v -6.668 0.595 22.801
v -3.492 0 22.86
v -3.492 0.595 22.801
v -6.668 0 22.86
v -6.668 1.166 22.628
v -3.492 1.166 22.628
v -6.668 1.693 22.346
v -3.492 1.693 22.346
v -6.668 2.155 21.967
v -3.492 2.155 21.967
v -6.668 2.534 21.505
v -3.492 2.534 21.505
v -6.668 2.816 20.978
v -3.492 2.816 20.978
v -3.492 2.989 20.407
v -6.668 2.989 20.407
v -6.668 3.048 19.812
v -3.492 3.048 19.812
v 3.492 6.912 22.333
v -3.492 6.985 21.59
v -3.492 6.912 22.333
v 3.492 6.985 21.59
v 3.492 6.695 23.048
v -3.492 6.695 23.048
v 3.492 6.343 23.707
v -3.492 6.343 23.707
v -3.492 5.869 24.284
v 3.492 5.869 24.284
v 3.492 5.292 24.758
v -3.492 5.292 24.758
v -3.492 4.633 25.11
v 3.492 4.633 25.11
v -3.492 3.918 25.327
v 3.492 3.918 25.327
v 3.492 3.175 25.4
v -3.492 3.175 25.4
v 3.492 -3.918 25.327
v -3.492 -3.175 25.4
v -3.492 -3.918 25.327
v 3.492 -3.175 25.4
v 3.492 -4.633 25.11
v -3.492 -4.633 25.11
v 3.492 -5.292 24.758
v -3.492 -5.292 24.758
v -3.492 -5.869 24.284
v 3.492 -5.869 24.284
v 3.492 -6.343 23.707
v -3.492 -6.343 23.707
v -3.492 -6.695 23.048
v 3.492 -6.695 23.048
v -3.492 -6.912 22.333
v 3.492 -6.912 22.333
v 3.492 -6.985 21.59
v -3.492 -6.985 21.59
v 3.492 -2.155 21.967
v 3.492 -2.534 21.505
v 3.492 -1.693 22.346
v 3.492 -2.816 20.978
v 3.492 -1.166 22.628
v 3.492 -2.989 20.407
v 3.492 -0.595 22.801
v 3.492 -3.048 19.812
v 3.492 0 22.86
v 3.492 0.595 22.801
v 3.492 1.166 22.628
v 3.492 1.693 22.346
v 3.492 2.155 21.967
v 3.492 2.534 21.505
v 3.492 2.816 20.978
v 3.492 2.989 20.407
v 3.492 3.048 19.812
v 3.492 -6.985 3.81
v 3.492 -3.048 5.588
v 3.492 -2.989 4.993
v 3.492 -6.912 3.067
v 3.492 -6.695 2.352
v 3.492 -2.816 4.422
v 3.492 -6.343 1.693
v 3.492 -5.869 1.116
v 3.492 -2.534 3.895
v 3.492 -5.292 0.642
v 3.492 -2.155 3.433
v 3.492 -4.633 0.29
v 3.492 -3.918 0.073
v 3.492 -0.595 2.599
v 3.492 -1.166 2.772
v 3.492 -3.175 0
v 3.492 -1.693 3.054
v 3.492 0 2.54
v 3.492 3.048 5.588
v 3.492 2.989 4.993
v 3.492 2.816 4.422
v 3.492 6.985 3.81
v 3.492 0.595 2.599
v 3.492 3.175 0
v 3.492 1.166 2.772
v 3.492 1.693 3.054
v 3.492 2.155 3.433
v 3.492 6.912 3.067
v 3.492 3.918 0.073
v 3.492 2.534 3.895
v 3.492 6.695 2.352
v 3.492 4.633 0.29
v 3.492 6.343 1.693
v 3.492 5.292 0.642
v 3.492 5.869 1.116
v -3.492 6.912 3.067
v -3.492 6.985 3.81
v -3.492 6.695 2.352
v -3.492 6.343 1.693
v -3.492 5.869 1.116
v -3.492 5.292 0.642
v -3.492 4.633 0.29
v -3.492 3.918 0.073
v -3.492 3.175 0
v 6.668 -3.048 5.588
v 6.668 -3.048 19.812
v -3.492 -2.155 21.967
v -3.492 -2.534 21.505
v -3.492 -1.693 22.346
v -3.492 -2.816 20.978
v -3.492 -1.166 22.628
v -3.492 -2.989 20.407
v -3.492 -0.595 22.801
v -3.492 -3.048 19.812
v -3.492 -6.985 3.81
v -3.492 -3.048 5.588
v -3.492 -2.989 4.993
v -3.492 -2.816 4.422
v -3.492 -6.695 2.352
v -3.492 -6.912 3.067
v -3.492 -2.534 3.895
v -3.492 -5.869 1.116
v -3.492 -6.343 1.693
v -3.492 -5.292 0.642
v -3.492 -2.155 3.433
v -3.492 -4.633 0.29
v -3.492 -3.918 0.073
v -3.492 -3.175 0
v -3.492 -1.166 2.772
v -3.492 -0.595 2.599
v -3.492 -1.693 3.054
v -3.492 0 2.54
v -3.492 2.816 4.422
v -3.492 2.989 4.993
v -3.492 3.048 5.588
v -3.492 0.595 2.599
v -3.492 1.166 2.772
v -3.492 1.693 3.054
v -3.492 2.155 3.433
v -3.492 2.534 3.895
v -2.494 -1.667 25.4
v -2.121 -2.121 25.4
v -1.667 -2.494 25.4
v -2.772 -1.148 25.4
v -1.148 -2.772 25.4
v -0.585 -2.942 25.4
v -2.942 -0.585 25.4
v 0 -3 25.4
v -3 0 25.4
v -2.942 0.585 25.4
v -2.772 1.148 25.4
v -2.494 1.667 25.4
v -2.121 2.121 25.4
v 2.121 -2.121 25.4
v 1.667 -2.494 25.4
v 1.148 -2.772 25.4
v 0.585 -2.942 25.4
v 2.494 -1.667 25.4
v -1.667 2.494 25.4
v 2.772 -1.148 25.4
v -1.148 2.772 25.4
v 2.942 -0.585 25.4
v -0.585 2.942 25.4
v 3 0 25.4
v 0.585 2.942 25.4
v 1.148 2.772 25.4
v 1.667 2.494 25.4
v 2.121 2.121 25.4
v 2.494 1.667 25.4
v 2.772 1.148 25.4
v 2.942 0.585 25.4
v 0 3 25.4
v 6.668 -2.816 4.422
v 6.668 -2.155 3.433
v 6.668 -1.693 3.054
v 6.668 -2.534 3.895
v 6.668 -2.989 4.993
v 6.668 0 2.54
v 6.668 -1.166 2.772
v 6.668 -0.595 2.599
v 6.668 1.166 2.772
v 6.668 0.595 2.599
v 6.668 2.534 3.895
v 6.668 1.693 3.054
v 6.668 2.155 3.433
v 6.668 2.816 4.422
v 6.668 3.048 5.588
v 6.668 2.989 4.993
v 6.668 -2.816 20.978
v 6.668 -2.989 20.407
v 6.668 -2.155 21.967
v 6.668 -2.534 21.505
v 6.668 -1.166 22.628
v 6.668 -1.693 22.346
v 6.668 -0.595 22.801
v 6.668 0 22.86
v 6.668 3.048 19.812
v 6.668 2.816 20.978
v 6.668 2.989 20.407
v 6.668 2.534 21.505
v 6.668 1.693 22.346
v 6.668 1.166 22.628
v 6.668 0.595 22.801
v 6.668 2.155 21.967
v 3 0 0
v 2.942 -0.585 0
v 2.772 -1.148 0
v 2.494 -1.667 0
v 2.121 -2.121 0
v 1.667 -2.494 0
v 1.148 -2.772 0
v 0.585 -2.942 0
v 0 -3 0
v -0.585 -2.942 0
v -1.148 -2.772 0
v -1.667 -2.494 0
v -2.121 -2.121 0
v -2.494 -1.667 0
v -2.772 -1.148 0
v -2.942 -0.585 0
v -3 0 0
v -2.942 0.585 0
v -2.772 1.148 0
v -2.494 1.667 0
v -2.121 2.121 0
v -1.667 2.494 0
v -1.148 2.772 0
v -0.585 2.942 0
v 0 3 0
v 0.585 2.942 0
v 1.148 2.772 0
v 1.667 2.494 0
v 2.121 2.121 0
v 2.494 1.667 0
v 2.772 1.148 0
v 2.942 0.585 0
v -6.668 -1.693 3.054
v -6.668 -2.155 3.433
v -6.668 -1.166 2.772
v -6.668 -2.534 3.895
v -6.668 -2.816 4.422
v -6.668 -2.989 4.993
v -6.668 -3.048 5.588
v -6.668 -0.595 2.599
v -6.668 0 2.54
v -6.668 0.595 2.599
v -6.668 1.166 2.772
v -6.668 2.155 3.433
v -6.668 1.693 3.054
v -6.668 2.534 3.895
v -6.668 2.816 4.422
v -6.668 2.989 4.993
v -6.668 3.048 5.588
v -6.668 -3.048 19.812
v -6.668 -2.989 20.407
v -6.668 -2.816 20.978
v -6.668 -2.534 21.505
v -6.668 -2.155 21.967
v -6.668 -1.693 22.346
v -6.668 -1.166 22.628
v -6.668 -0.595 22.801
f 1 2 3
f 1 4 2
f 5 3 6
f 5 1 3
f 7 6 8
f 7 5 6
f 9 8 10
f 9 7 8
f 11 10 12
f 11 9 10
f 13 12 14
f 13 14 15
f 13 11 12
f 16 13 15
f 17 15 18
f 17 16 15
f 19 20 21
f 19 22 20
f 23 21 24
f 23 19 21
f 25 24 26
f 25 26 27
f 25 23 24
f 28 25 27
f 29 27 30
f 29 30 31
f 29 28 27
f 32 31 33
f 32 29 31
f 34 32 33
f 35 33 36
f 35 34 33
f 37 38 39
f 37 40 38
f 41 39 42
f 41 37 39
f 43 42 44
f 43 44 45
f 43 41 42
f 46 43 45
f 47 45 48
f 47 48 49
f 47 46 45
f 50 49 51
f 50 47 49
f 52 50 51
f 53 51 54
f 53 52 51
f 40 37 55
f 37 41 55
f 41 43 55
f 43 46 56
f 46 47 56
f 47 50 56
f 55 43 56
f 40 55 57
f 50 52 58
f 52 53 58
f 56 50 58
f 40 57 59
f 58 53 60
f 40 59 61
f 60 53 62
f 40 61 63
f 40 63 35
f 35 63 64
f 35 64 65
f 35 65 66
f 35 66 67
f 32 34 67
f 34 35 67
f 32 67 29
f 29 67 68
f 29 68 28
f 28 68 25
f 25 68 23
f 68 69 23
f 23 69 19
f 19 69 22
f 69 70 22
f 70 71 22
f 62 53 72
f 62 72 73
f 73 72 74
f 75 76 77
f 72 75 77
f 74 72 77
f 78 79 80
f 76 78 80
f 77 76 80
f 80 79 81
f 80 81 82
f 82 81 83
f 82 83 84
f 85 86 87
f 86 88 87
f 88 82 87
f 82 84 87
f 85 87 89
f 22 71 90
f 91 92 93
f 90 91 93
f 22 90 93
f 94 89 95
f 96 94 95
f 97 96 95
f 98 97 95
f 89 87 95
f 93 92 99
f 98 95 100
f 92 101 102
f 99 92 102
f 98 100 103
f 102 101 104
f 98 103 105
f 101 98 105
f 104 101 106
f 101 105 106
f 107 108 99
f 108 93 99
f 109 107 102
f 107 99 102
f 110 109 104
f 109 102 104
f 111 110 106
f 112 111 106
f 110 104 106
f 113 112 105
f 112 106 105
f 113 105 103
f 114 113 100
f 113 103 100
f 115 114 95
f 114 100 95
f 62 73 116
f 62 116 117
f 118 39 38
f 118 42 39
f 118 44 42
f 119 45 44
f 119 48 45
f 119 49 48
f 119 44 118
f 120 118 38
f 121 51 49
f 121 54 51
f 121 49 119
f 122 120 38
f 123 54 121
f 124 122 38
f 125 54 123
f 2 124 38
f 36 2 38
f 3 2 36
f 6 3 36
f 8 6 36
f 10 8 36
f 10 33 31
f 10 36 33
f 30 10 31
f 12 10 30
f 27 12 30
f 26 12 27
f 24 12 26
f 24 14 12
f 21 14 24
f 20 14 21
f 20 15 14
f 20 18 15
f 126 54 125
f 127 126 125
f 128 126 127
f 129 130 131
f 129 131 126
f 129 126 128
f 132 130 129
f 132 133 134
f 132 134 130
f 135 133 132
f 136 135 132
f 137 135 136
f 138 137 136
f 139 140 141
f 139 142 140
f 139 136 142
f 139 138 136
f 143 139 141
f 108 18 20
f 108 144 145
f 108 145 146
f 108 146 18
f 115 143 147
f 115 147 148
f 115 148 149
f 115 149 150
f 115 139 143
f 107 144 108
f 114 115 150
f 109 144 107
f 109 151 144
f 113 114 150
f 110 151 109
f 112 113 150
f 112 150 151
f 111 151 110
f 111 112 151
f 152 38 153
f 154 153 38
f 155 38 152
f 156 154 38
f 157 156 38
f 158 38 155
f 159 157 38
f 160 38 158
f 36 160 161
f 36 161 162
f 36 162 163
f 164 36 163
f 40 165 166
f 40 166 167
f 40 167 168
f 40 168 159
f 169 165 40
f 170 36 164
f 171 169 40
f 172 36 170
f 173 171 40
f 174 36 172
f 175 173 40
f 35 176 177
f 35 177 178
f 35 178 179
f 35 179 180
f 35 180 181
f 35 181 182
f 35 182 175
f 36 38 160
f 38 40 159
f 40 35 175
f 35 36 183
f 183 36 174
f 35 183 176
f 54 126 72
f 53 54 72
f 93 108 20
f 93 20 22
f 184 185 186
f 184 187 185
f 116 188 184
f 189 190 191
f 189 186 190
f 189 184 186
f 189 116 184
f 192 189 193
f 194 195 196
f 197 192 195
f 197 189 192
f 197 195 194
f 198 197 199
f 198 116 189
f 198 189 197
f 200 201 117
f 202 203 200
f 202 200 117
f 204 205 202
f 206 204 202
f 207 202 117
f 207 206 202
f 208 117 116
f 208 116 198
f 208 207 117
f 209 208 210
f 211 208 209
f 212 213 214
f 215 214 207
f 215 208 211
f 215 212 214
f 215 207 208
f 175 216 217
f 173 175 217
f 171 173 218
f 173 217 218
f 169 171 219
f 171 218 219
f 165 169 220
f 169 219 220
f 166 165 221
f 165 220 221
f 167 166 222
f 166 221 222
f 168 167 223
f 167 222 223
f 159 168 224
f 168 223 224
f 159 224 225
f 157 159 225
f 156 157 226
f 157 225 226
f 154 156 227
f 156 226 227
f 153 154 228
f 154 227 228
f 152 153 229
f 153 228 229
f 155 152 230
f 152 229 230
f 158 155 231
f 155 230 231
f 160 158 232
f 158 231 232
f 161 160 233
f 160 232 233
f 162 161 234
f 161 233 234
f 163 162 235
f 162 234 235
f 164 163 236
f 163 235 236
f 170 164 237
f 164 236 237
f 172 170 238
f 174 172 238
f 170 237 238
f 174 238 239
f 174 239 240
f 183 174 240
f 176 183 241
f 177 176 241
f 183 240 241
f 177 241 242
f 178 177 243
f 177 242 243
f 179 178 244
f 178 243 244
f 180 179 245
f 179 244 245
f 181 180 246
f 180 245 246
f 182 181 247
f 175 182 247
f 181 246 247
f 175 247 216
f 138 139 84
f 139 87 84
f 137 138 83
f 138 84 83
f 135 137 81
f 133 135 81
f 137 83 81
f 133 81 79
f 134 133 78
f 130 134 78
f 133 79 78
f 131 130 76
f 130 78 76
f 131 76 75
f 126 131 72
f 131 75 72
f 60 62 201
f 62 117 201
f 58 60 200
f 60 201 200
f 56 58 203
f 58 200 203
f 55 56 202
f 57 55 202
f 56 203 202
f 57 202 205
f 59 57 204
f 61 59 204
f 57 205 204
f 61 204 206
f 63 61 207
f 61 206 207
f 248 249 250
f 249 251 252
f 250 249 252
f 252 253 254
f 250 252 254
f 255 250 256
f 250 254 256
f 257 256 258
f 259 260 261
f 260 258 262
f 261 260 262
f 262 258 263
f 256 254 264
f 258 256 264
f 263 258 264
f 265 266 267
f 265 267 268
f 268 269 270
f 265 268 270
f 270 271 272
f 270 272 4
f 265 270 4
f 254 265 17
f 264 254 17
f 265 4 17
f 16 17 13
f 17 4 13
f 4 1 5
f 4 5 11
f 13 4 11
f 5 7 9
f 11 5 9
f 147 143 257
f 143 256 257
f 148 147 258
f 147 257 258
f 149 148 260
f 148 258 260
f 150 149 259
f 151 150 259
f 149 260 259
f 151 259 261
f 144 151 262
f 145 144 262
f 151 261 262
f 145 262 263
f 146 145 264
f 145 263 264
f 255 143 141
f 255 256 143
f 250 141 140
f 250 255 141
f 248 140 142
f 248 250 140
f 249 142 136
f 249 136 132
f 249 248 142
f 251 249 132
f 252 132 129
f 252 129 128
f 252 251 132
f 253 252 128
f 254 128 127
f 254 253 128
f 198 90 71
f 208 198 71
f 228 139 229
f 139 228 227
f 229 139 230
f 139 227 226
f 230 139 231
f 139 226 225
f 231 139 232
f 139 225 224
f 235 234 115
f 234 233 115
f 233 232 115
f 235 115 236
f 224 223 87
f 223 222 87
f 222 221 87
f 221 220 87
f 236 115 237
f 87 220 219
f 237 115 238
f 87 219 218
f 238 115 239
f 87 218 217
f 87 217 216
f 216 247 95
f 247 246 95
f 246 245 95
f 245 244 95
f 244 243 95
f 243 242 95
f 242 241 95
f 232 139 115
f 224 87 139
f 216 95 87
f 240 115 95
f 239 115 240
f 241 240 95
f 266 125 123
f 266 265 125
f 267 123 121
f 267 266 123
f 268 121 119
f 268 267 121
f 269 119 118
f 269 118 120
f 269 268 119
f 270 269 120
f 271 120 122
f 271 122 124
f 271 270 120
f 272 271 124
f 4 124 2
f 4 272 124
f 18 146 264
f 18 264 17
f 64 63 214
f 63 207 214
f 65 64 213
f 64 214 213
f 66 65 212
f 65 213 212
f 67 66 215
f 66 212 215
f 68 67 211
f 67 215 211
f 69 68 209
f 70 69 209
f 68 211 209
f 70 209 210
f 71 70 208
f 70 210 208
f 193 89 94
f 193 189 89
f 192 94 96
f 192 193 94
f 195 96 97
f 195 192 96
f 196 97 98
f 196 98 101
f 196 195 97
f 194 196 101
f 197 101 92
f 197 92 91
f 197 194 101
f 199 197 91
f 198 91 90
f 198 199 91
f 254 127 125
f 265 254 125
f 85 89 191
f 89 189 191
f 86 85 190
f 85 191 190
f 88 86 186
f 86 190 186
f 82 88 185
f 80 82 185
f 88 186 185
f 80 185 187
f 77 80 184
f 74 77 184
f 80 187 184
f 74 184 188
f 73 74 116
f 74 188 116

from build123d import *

# Parameters (mm, degrees)
F0_W     = 6.985
F0_H     = 13.97
F1_DEPTH = 25.4
F2_R     = 3
F3_DEPTH = 25.4
F4_W     = 3.048
F4_H     = 20.32
F5_DEPTH = 3.175
F6_R     = 3.04799
F8_R     = 3.81


# Not quite as in the source:
# - a fillet or chamfer is up to 0.001 mm smaller than in the source, because OpenCascade refuses the exact size


with BuildPart() as f1:
    # F0 (on Top) → F1 (new body)
    with BuildSketch(Plane.XY):
        Rectangle(F0_W, F0_H)
    extrude(amount=F1_DEPTH)

    # F2 (on face) → F3 (cut)
    with BuildSketch(Plane(origin=(0, 0, 0), x_dir=(1, 0, 0), z_dir=(0, 0, -1))):
        Circle(F2_R)
    extrude(amount=-F3_DEPTH, mode=Mode.SUBTRACT)

    # F4 (on face) → F5 (join)
    with BuildSketch(Plane.YZ.offset(3.4925)):
        with Locations((1.524, 12.7)):
            Rectangle(F4_W, F4_H)
        with Locations((-1.524, 12.7)):
            Rectangle(F4_W, F4_H)
    extrude(amount=F5_DEPTH)

    # F6 (radius 3.048 in the source; OpenCascade refuses exactly that, so slightly less here)
    f6_edges = [f1.edges().sort_by_distance(p)[0] for p in [
        (5.08, -3.048, 22.86),
        (5.08, 3.048, 22.86),
        (5.08, 3.048, 2.54),
        (5.08, -3.048, 2.54),
    ]]
    fillet(f6_edges, radius=F6_R)

    # F7: F1 across plane


with BuildPart() as f1_1:
    add(f1.part)
    add(f1.part.mirror(Plane.YZ))

    # F8
    f8_edges = [f1_1.edges().sort_by_distance(p)[0] for p in [
        (0, -6.985, 0),
        (0, 6.985, 0),
        (0, 6.985, 25.4),
        (0, -6.985, 25.4),
    ]]
    fillet(f8_edges, radius=F8_R)


solid = f1_1.part
